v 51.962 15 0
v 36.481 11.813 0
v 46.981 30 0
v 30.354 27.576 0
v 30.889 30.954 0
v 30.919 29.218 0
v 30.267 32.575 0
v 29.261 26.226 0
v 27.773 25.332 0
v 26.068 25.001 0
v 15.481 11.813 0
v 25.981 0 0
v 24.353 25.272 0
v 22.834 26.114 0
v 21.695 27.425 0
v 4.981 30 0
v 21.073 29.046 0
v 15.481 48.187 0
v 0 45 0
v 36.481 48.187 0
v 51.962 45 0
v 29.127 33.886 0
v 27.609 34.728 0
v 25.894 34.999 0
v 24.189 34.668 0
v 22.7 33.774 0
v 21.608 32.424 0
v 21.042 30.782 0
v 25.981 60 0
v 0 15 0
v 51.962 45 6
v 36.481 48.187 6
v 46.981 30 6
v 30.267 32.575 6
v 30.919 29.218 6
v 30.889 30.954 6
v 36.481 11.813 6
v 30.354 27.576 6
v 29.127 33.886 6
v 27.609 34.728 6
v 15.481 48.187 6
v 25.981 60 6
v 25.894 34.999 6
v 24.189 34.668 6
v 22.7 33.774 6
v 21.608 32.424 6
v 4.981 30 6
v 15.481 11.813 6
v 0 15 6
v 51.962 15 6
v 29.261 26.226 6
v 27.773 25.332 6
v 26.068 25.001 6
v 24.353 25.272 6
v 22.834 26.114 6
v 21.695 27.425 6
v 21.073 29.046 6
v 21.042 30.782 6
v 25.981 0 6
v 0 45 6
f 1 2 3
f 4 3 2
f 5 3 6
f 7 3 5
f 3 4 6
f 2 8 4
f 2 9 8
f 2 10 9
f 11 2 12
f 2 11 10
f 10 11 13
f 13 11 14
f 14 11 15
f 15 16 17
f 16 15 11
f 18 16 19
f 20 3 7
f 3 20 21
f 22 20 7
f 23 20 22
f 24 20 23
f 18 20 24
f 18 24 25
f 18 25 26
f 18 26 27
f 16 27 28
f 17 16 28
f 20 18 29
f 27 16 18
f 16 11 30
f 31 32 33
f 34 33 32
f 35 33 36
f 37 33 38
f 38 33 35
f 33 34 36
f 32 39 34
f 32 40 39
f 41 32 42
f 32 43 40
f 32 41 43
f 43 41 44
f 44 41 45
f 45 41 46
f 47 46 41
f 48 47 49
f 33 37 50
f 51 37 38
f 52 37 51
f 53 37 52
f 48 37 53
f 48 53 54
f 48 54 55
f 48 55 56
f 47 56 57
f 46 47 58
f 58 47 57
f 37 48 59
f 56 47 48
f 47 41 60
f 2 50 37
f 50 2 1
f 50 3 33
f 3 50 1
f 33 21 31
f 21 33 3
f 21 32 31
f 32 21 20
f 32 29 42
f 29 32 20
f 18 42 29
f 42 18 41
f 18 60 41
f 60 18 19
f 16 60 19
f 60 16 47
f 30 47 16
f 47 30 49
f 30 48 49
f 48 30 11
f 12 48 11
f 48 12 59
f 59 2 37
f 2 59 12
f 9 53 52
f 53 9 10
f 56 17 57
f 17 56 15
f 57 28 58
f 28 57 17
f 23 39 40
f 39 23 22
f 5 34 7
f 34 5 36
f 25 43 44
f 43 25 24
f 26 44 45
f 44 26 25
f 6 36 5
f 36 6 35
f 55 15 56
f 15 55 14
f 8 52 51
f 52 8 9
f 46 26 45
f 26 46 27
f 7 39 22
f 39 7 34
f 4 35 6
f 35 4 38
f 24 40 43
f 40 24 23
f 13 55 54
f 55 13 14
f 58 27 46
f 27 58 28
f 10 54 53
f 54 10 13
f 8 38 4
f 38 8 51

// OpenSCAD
$fn = 32;

// ----------------------------------------------------------------------
// Star wheel: 6-point blunt, R30
// ----------------------------------------------------------------------

// --- parameters (mm) ---
n_points = 6;             // number of points / teeth
r_out = 30;               // tip radius
r_in = 21;                // root radius
bore_r = 5;               // centre bore radius
plate_t = 6;              // plate thickness, Z (extrusion height)
bore_d = 10;              // centre bore diameter

profile = [[25.981, 60], [15.481, 48.187], [0, 45], [4.981, 30], [0, 15], [15.481, 11.813], [25.981, 0], [36.481, 11.813], [51.962, 15], [46.981, 30], [51.962, 45], [36.481, 48.187]];  // primary outline, 12 points, counter clockwise
void_1 = [[30.889, 30.954], [30.267, 32.575], [29.127, 33.886], [27.609, 34.728], [25.894, 34.999], [24.189, 34.668], [22.7, 33.774], [21.608, 32.424], [21.042, 30.782], [21.073, 29.046], [21.695, 27.425], [22.834, 26.114], [24.353, 25.272], [26.068, 25.001], [27.773, 25.332], [29.261, 26.226], [30.354, 27.576], [30.919, 29.218]];  // centre bore, 18 points

// --- the one profile operation ---
difference() {
  linear_extrude(height = plate_t) polygon(points = profile);
  translate([0, 0, -1])
    linear_extrude(height = plate_t + 2) polygon(points = void_1);
}
